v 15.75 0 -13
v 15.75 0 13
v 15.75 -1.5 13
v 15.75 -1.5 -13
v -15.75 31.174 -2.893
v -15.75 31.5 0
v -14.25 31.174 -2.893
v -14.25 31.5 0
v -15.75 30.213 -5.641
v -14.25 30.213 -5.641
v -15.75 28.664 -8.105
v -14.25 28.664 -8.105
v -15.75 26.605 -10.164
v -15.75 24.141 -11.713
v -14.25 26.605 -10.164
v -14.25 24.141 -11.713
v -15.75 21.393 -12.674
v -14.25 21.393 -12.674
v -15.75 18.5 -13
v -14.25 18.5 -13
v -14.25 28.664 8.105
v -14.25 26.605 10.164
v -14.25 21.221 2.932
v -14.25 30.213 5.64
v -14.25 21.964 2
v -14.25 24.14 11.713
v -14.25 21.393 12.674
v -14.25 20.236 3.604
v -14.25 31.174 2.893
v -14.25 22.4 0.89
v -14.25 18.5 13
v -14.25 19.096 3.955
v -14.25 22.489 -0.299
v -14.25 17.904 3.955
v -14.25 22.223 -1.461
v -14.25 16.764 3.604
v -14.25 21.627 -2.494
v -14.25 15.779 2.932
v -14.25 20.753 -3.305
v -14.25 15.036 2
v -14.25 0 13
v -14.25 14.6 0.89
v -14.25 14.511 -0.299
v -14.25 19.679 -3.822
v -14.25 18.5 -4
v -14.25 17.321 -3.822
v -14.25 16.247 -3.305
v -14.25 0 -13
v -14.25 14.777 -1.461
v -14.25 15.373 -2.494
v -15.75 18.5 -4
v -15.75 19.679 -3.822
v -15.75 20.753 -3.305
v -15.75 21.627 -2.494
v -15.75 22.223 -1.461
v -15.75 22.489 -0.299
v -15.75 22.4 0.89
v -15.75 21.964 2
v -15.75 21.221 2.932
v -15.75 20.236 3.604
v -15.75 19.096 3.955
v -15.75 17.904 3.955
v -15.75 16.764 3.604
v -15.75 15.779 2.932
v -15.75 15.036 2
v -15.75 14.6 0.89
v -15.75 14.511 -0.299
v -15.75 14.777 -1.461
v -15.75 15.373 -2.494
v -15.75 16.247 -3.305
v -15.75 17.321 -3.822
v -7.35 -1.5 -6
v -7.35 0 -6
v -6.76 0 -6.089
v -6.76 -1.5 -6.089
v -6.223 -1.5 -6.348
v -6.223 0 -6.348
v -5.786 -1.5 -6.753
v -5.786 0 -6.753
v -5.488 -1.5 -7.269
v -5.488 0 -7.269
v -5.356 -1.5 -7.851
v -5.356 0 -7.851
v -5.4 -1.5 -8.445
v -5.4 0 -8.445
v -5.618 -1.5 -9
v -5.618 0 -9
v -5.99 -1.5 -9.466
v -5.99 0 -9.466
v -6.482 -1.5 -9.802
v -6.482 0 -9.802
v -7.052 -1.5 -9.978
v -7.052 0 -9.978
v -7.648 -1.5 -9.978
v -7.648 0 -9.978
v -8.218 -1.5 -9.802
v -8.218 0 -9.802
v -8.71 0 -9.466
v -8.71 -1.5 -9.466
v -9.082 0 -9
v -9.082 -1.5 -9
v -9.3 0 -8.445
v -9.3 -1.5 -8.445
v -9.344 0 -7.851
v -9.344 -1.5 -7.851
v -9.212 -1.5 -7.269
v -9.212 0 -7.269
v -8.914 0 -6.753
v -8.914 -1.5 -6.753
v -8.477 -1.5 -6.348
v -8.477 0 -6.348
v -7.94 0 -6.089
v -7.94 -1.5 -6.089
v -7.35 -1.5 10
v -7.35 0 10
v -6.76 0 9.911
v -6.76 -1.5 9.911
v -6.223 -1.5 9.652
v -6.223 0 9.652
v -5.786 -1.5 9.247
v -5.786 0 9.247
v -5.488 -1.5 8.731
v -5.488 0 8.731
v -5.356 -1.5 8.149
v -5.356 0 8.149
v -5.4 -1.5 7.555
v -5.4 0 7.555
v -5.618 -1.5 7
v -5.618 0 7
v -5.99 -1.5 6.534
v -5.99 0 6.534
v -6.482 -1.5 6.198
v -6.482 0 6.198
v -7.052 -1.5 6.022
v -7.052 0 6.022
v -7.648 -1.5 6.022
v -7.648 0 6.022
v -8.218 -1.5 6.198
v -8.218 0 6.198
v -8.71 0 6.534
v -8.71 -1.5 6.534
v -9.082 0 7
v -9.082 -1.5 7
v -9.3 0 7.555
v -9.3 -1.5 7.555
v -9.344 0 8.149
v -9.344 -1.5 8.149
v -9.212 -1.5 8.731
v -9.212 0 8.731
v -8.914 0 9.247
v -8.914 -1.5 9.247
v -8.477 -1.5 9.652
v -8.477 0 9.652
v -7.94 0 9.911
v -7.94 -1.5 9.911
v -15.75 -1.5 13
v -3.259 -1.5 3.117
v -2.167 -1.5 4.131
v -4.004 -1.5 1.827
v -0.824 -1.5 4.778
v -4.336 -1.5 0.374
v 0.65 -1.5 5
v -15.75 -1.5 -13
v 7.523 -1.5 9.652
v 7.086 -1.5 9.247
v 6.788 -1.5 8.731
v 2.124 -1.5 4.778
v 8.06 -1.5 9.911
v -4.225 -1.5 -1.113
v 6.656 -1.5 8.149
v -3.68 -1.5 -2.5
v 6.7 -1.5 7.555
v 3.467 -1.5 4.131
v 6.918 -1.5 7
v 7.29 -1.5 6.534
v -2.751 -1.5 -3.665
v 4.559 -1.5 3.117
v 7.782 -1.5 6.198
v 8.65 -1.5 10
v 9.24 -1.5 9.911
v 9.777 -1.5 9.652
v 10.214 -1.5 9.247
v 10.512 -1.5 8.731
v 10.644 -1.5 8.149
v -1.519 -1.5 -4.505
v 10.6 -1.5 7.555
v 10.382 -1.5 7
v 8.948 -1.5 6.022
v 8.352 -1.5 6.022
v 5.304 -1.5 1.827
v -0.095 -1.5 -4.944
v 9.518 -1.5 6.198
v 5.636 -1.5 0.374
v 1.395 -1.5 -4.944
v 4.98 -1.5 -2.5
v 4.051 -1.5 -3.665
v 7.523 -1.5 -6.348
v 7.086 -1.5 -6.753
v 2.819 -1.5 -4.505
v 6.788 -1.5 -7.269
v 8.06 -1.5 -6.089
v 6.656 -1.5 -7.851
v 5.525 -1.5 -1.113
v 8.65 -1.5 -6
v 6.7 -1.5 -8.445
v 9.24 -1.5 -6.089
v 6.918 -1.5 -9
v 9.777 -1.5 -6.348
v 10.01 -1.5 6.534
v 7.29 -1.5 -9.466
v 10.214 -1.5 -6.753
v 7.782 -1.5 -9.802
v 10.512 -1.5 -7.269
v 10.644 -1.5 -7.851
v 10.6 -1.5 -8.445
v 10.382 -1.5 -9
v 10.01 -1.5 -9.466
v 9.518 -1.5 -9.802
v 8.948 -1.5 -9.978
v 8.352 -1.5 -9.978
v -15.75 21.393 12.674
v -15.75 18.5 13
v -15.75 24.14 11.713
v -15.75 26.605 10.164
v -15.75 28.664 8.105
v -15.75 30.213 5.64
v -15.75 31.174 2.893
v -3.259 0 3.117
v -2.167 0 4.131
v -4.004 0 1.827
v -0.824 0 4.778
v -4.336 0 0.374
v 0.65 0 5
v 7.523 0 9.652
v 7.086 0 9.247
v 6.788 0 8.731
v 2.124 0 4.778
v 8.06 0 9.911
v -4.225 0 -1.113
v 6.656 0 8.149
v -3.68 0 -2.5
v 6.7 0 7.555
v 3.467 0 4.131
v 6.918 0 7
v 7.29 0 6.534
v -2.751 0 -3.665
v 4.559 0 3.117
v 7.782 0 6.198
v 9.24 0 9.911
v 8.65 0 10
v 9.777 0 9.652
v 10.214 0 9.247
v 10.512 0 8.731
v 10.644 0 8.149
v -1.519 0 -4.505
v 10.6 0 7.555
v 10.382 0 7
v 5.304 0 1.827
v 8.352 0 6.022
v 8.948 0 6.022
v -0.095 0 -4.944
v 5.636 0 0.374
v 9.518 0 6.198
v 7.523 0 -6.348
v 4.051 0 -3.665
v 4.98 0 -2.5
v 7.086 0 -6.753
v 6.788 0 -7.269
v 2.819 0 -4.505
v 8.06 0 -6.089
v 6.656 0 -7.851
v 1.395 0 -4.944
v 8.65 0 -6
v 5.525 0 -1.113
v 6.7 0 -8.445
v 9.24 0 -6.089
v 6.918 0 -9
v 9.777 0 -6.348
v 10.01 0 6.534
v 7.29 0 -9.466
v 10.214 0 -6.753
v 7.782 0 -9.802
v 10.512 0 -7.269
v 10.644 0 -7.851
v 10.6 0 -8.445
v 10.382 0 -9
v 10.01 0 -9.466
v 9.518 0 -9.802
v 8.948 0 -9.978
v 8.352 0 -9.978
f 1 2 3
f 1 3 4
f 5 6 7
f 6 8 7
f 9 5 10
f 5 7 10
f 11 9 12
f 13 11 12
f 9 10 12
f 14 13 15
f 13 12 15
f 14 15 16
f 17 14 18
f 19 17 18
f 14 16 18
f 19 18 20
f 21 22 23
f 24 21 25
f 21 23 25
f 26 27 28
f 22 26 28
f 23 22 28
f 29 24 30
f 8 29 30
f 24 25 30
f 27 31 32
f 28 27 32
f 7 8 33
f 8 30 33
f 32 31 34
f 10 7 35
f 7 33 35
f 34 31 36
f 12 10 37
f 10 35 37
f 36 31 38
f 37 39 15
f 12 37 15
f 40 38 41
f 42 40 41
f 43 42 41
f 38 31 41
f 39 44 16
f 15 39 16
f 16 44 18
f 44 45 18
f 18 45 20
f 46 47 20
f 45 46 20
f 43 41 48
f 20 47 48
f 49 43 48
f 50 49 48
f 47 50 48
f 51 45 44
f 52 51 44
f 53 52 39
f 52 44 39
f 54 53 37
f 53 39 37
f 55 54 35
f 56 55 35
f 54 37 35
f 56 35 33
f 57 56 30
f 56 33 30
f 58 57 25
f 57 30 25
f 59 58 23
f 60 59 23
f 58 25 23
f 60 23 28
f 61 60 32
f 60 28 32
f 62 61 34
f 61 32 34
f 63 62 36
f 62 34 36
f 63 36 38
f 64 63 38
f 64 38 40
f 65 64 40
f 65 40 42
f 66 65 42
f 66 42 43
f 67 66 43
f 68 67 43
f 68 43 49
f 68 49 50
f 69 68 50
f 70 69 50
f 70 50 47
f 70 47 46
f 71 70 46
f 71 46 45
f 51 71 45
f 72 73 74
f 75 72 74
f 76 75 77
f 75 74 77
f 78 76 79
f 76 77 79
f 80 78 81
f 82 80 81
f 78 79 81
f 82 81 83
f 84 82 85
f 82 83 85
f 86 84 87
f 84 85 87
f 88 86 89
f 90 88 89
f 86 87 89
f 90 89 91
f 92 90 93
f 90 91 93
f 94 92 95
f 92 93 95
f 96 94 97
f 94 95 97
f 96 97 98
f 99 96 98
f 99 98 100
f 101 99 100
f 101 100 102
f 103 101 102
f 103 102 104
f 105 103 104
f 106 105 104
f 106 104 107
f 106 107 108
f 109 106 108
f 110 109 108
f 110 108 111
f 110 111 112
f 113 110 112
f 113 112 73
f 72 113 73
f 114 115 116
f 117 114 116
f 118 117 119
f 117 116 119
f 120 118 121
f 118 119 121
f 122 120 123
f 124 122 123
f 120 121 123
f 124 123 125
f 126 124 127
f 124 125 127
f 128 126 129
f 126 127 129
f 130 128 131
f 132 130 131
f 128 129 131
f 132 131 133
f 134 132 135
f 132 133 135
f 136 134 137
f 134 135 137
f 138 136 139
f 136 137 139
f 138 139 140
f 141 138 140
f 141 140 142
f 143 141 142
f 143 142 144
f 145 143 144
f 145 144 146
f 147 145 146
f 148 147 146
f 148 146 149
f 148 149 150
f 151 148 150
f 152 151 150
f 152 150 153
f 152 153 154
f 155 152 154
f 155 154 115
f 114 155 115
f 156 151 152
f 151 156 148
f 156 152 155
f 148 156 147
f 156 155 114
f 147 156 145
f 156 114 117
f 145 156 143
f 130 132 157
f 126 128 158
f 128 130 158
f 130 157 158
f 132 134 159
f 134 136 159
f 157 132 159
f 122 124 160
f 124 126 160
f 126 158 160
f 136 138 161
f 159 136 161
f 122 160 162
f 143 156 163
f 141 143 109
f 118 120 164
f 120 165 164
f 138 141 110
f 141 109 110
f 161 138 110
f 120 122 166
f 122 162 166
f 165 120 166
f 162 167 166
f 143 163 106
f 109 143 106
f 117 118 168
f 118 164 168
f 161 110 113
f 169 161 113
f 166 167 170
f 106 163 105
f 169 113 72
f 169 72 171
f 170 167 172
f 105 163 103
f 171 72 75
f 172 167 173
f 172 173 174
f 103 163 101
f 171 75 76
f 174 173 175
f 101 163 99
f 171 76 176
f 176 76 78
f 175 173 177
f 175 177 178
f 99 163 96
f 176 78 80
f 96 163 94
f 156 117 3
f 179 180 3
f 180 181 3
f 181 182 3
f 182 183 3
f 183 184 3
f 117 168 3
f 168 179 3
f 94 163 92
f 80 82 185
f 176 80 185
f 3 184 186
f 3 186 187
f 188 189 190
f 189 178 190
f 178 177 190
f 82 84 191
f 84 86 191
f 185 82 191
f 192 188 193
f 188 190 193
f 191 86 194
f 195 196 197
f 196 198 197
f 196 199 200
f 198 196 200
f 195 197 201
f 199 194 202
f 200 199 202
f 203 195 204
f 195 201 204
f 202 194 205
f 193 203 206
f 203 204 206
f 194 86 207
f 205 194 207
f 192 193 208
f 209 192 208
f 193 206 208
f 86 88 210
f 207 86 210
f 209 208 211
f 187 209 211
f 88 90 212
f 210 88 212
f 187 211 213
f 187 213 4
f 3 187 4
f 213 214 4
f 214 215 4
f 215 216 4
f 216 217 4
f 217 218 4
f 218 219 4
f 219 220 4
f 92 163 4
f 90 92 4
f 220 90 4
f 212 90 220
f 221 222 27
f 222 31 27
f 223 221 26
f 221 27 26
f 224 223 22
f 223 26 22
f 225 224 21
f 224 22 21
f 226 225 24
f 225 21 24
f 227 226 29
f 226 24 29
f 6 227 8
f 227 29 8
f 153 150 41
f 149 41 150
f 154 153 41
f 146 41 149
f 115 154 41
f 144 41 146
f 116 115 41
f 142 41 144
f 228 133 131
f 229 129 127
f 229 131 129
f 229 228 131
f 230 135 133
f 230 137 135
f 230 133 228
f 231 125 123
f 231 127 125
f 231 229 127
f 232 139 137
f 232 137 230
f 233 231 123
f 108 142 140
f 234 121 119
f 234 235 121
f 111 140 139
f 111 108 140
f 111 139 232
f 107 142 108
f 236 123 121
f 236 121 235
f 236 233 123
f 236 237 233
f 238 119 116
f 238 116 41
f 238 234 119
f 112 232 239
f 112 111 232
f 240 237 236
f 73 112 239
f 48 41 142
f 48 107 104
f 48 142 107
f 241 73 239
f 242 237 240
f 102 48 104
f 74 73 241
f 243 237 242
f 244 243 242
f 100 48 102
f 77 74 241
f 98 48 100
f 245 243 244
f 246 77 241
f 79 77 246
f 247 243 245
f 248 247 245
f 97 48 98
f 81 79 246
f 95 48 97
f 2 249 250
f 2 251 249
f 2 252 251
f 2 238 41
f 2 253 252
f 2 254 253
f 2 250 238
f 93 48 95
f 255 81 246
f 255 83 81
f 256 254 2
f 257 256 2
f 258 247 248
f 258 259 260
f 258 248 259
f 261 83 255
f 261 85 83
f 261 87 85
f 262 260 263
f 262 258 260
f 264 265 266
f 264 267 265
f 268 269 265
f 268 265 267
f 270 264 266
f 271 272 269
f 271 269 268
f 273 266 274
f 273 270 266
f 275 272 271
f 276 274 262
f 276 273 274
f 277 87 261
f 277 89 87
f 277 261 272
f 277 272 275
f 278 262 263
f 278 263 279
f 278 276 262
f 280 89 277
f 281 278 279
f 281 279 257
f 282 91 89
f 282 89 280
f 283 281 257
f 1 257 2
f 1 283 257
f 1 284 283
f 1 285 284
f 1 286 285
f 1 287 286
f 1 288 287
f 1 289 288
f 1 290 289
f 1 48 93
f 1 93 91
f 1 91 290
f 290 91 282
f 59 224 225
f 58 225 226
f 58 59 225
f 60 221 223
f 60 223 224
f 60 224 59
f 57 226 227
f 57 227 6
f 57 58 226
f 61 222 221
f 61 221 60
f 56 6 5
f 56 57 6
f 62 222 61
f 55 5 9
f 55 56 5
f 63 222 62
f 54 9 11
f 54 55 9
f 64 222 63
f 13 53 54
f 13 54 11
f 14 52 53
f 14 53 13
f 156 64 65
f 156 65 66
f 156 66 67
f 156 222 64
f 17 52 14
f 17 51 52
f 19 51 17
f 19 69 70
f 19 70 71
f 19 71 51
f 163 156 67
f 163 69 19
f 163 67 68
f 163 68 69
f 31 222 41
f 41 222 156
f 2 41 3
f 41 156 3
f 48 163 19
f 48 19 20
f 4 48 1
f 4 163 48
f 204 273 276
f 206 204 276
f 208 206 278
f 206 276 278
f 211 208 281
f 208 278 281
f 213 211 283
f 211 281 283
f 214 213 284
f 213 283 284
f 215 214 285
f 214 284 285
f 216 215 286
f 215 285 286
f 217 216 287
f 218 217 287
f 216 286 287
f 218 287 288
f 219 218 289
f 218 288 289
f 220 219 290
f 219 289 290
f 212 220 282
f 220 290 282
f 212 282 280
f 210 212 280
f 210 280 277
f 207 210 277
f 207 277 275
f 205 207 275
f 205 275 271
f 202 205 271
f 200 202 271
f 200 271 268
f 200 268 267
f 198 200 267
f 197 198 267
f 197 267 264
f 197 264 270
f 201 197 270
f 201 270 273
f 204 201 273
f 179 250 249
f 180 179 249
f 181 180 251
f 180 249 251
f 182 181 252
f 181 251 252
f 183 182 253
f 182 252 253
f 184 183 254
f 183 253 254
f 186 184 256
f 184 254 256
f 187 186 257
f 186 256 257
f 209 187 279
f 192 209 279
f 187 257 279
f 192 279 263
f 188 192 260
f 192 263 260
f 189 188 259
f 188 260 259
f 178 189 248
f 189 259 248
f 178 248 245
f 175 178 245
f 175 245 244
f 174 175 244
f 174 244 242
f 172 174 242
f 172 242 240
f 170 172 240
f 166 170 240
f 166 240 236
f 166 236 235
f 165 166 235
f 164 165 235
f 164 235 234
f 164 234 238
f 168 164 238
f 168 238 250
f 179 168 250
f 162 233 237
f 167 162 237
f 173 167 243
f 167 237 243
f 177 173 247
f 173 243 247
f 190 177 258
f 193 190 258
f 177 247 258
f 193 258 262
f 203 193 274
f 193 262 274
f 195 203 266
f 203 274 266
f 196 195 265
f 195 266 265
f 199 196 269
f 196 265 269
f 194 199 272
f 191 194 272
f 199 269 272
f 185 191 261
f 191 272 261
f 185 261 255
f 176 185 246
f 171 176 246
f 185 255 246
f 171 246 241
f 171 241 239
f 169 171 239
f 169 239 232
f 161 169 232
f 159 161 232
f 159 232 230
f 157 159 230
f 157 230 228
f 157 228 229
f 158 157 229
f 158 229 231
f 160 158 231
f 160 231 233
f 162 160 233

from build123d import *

# Parameters (mm, degrees)
SKETCH3_W           = 31.5
SKETCH3_H           = 26
BOSS_EXTRUDE1_DEPTH = 1.5
SKETCH4_W           = 1.5
SKETCH4_H           = 26
BOSS_EXTRUDE3_DEPTH = 31.5
FILLET3_R           = 13
FILLET4_R           = 13
SKETCH5_R           = 4
CUT_EXTRUDE1_DEPTH  = 31.5
SKETCH7_R           = 2
SKETCH7_R_2         = 5
CUT_EXTRUDE2_DEPTH  = 10


with BuildPart() as part:
    # Sketch3 → Boss-Extrude1 (new body)
    with BuildSketch(Plane(origin=(0, 0, 0), x_dir=(1, 0, 0), z_dir=(0, 1, 0))):
        Rectangle(SKETCH3_W, SKETCH3_H)
    extrude(amount=-BOSS_EXTRUDE1_DEPTH)

    # Sketch4 → Boss-Extrude3 (add)
    with BuildSketch(Plane(origin=(0, 0, 0), x_dir=(1, 0, 0), z_dir=(0, 1, 0))):
        with Locations((-15, 0)):
            Rectangle(SKETCH4_W, SKETCH4_H)
    extrude(amount=BOSS_EXTRUDE3_DEPTH)

    # Fillet3
    fillet3_edges = [part.edges().sort_by_distance(p)[0] for p in [
        (-15, 31.5, 13),
    ]]
    fillet(fillet3_edges, radius=FILLET3_R)

    # Fillet4
    fillet4_edges = [part.edges().sort_by_distance(p)[0] for p in [
        (-15, 31.5, -13),
    ]]
    fillet(fillet4_edges, radius=FILLET4_R - 0.0001)  # a hair under: the kernel refuses the full size

    # Sketch5 → Cut-Extrude1 (cut)
    with BuildSketch(Plane(origin=(-14.25, 0, 0), x_dir=(0, 0, -1), z_dir=(1, 0, 0))):
        with Locations((0, 18.5)):
            Circle(SKETCH5_R)
    extrude(amount=-CUT_EXTRUDE1_DEPTH, mode=Mode.SUBTRACT)

    # Sketch7 → Cut-Extrude2 (cut)
    with BuildSketch(Plane(origin=(0, 0, 0), x_dir=(1, 0, 0), z_dir=(0, 1, 0))):
        with Locations(Location((8.65, 8, 0), (0, 0, 270))):
            Circle(SKETCH7_R)
        with Locations(Location((8.65, -8, 0), (0, 0, 270))):
            Circle(SKETCH7_R)
        with Locations(Location((0.65, 0, 0), (0, 0, 270))):
            Circle(SKETCH7_R_2)
        with Locations(Location((-7.35, 8, 0), (0, 0, 270))):
            Circle(SKETCH7_R)
        with Locations(Location((-7.35, -8, 0), (0, 0, 270))):
            Circle(SKETCH7_R)
    extrude(amount=-CUT_EXTRUDE2_DEPTH, mode=Mode.SUBTRACT)


solid = part.part
